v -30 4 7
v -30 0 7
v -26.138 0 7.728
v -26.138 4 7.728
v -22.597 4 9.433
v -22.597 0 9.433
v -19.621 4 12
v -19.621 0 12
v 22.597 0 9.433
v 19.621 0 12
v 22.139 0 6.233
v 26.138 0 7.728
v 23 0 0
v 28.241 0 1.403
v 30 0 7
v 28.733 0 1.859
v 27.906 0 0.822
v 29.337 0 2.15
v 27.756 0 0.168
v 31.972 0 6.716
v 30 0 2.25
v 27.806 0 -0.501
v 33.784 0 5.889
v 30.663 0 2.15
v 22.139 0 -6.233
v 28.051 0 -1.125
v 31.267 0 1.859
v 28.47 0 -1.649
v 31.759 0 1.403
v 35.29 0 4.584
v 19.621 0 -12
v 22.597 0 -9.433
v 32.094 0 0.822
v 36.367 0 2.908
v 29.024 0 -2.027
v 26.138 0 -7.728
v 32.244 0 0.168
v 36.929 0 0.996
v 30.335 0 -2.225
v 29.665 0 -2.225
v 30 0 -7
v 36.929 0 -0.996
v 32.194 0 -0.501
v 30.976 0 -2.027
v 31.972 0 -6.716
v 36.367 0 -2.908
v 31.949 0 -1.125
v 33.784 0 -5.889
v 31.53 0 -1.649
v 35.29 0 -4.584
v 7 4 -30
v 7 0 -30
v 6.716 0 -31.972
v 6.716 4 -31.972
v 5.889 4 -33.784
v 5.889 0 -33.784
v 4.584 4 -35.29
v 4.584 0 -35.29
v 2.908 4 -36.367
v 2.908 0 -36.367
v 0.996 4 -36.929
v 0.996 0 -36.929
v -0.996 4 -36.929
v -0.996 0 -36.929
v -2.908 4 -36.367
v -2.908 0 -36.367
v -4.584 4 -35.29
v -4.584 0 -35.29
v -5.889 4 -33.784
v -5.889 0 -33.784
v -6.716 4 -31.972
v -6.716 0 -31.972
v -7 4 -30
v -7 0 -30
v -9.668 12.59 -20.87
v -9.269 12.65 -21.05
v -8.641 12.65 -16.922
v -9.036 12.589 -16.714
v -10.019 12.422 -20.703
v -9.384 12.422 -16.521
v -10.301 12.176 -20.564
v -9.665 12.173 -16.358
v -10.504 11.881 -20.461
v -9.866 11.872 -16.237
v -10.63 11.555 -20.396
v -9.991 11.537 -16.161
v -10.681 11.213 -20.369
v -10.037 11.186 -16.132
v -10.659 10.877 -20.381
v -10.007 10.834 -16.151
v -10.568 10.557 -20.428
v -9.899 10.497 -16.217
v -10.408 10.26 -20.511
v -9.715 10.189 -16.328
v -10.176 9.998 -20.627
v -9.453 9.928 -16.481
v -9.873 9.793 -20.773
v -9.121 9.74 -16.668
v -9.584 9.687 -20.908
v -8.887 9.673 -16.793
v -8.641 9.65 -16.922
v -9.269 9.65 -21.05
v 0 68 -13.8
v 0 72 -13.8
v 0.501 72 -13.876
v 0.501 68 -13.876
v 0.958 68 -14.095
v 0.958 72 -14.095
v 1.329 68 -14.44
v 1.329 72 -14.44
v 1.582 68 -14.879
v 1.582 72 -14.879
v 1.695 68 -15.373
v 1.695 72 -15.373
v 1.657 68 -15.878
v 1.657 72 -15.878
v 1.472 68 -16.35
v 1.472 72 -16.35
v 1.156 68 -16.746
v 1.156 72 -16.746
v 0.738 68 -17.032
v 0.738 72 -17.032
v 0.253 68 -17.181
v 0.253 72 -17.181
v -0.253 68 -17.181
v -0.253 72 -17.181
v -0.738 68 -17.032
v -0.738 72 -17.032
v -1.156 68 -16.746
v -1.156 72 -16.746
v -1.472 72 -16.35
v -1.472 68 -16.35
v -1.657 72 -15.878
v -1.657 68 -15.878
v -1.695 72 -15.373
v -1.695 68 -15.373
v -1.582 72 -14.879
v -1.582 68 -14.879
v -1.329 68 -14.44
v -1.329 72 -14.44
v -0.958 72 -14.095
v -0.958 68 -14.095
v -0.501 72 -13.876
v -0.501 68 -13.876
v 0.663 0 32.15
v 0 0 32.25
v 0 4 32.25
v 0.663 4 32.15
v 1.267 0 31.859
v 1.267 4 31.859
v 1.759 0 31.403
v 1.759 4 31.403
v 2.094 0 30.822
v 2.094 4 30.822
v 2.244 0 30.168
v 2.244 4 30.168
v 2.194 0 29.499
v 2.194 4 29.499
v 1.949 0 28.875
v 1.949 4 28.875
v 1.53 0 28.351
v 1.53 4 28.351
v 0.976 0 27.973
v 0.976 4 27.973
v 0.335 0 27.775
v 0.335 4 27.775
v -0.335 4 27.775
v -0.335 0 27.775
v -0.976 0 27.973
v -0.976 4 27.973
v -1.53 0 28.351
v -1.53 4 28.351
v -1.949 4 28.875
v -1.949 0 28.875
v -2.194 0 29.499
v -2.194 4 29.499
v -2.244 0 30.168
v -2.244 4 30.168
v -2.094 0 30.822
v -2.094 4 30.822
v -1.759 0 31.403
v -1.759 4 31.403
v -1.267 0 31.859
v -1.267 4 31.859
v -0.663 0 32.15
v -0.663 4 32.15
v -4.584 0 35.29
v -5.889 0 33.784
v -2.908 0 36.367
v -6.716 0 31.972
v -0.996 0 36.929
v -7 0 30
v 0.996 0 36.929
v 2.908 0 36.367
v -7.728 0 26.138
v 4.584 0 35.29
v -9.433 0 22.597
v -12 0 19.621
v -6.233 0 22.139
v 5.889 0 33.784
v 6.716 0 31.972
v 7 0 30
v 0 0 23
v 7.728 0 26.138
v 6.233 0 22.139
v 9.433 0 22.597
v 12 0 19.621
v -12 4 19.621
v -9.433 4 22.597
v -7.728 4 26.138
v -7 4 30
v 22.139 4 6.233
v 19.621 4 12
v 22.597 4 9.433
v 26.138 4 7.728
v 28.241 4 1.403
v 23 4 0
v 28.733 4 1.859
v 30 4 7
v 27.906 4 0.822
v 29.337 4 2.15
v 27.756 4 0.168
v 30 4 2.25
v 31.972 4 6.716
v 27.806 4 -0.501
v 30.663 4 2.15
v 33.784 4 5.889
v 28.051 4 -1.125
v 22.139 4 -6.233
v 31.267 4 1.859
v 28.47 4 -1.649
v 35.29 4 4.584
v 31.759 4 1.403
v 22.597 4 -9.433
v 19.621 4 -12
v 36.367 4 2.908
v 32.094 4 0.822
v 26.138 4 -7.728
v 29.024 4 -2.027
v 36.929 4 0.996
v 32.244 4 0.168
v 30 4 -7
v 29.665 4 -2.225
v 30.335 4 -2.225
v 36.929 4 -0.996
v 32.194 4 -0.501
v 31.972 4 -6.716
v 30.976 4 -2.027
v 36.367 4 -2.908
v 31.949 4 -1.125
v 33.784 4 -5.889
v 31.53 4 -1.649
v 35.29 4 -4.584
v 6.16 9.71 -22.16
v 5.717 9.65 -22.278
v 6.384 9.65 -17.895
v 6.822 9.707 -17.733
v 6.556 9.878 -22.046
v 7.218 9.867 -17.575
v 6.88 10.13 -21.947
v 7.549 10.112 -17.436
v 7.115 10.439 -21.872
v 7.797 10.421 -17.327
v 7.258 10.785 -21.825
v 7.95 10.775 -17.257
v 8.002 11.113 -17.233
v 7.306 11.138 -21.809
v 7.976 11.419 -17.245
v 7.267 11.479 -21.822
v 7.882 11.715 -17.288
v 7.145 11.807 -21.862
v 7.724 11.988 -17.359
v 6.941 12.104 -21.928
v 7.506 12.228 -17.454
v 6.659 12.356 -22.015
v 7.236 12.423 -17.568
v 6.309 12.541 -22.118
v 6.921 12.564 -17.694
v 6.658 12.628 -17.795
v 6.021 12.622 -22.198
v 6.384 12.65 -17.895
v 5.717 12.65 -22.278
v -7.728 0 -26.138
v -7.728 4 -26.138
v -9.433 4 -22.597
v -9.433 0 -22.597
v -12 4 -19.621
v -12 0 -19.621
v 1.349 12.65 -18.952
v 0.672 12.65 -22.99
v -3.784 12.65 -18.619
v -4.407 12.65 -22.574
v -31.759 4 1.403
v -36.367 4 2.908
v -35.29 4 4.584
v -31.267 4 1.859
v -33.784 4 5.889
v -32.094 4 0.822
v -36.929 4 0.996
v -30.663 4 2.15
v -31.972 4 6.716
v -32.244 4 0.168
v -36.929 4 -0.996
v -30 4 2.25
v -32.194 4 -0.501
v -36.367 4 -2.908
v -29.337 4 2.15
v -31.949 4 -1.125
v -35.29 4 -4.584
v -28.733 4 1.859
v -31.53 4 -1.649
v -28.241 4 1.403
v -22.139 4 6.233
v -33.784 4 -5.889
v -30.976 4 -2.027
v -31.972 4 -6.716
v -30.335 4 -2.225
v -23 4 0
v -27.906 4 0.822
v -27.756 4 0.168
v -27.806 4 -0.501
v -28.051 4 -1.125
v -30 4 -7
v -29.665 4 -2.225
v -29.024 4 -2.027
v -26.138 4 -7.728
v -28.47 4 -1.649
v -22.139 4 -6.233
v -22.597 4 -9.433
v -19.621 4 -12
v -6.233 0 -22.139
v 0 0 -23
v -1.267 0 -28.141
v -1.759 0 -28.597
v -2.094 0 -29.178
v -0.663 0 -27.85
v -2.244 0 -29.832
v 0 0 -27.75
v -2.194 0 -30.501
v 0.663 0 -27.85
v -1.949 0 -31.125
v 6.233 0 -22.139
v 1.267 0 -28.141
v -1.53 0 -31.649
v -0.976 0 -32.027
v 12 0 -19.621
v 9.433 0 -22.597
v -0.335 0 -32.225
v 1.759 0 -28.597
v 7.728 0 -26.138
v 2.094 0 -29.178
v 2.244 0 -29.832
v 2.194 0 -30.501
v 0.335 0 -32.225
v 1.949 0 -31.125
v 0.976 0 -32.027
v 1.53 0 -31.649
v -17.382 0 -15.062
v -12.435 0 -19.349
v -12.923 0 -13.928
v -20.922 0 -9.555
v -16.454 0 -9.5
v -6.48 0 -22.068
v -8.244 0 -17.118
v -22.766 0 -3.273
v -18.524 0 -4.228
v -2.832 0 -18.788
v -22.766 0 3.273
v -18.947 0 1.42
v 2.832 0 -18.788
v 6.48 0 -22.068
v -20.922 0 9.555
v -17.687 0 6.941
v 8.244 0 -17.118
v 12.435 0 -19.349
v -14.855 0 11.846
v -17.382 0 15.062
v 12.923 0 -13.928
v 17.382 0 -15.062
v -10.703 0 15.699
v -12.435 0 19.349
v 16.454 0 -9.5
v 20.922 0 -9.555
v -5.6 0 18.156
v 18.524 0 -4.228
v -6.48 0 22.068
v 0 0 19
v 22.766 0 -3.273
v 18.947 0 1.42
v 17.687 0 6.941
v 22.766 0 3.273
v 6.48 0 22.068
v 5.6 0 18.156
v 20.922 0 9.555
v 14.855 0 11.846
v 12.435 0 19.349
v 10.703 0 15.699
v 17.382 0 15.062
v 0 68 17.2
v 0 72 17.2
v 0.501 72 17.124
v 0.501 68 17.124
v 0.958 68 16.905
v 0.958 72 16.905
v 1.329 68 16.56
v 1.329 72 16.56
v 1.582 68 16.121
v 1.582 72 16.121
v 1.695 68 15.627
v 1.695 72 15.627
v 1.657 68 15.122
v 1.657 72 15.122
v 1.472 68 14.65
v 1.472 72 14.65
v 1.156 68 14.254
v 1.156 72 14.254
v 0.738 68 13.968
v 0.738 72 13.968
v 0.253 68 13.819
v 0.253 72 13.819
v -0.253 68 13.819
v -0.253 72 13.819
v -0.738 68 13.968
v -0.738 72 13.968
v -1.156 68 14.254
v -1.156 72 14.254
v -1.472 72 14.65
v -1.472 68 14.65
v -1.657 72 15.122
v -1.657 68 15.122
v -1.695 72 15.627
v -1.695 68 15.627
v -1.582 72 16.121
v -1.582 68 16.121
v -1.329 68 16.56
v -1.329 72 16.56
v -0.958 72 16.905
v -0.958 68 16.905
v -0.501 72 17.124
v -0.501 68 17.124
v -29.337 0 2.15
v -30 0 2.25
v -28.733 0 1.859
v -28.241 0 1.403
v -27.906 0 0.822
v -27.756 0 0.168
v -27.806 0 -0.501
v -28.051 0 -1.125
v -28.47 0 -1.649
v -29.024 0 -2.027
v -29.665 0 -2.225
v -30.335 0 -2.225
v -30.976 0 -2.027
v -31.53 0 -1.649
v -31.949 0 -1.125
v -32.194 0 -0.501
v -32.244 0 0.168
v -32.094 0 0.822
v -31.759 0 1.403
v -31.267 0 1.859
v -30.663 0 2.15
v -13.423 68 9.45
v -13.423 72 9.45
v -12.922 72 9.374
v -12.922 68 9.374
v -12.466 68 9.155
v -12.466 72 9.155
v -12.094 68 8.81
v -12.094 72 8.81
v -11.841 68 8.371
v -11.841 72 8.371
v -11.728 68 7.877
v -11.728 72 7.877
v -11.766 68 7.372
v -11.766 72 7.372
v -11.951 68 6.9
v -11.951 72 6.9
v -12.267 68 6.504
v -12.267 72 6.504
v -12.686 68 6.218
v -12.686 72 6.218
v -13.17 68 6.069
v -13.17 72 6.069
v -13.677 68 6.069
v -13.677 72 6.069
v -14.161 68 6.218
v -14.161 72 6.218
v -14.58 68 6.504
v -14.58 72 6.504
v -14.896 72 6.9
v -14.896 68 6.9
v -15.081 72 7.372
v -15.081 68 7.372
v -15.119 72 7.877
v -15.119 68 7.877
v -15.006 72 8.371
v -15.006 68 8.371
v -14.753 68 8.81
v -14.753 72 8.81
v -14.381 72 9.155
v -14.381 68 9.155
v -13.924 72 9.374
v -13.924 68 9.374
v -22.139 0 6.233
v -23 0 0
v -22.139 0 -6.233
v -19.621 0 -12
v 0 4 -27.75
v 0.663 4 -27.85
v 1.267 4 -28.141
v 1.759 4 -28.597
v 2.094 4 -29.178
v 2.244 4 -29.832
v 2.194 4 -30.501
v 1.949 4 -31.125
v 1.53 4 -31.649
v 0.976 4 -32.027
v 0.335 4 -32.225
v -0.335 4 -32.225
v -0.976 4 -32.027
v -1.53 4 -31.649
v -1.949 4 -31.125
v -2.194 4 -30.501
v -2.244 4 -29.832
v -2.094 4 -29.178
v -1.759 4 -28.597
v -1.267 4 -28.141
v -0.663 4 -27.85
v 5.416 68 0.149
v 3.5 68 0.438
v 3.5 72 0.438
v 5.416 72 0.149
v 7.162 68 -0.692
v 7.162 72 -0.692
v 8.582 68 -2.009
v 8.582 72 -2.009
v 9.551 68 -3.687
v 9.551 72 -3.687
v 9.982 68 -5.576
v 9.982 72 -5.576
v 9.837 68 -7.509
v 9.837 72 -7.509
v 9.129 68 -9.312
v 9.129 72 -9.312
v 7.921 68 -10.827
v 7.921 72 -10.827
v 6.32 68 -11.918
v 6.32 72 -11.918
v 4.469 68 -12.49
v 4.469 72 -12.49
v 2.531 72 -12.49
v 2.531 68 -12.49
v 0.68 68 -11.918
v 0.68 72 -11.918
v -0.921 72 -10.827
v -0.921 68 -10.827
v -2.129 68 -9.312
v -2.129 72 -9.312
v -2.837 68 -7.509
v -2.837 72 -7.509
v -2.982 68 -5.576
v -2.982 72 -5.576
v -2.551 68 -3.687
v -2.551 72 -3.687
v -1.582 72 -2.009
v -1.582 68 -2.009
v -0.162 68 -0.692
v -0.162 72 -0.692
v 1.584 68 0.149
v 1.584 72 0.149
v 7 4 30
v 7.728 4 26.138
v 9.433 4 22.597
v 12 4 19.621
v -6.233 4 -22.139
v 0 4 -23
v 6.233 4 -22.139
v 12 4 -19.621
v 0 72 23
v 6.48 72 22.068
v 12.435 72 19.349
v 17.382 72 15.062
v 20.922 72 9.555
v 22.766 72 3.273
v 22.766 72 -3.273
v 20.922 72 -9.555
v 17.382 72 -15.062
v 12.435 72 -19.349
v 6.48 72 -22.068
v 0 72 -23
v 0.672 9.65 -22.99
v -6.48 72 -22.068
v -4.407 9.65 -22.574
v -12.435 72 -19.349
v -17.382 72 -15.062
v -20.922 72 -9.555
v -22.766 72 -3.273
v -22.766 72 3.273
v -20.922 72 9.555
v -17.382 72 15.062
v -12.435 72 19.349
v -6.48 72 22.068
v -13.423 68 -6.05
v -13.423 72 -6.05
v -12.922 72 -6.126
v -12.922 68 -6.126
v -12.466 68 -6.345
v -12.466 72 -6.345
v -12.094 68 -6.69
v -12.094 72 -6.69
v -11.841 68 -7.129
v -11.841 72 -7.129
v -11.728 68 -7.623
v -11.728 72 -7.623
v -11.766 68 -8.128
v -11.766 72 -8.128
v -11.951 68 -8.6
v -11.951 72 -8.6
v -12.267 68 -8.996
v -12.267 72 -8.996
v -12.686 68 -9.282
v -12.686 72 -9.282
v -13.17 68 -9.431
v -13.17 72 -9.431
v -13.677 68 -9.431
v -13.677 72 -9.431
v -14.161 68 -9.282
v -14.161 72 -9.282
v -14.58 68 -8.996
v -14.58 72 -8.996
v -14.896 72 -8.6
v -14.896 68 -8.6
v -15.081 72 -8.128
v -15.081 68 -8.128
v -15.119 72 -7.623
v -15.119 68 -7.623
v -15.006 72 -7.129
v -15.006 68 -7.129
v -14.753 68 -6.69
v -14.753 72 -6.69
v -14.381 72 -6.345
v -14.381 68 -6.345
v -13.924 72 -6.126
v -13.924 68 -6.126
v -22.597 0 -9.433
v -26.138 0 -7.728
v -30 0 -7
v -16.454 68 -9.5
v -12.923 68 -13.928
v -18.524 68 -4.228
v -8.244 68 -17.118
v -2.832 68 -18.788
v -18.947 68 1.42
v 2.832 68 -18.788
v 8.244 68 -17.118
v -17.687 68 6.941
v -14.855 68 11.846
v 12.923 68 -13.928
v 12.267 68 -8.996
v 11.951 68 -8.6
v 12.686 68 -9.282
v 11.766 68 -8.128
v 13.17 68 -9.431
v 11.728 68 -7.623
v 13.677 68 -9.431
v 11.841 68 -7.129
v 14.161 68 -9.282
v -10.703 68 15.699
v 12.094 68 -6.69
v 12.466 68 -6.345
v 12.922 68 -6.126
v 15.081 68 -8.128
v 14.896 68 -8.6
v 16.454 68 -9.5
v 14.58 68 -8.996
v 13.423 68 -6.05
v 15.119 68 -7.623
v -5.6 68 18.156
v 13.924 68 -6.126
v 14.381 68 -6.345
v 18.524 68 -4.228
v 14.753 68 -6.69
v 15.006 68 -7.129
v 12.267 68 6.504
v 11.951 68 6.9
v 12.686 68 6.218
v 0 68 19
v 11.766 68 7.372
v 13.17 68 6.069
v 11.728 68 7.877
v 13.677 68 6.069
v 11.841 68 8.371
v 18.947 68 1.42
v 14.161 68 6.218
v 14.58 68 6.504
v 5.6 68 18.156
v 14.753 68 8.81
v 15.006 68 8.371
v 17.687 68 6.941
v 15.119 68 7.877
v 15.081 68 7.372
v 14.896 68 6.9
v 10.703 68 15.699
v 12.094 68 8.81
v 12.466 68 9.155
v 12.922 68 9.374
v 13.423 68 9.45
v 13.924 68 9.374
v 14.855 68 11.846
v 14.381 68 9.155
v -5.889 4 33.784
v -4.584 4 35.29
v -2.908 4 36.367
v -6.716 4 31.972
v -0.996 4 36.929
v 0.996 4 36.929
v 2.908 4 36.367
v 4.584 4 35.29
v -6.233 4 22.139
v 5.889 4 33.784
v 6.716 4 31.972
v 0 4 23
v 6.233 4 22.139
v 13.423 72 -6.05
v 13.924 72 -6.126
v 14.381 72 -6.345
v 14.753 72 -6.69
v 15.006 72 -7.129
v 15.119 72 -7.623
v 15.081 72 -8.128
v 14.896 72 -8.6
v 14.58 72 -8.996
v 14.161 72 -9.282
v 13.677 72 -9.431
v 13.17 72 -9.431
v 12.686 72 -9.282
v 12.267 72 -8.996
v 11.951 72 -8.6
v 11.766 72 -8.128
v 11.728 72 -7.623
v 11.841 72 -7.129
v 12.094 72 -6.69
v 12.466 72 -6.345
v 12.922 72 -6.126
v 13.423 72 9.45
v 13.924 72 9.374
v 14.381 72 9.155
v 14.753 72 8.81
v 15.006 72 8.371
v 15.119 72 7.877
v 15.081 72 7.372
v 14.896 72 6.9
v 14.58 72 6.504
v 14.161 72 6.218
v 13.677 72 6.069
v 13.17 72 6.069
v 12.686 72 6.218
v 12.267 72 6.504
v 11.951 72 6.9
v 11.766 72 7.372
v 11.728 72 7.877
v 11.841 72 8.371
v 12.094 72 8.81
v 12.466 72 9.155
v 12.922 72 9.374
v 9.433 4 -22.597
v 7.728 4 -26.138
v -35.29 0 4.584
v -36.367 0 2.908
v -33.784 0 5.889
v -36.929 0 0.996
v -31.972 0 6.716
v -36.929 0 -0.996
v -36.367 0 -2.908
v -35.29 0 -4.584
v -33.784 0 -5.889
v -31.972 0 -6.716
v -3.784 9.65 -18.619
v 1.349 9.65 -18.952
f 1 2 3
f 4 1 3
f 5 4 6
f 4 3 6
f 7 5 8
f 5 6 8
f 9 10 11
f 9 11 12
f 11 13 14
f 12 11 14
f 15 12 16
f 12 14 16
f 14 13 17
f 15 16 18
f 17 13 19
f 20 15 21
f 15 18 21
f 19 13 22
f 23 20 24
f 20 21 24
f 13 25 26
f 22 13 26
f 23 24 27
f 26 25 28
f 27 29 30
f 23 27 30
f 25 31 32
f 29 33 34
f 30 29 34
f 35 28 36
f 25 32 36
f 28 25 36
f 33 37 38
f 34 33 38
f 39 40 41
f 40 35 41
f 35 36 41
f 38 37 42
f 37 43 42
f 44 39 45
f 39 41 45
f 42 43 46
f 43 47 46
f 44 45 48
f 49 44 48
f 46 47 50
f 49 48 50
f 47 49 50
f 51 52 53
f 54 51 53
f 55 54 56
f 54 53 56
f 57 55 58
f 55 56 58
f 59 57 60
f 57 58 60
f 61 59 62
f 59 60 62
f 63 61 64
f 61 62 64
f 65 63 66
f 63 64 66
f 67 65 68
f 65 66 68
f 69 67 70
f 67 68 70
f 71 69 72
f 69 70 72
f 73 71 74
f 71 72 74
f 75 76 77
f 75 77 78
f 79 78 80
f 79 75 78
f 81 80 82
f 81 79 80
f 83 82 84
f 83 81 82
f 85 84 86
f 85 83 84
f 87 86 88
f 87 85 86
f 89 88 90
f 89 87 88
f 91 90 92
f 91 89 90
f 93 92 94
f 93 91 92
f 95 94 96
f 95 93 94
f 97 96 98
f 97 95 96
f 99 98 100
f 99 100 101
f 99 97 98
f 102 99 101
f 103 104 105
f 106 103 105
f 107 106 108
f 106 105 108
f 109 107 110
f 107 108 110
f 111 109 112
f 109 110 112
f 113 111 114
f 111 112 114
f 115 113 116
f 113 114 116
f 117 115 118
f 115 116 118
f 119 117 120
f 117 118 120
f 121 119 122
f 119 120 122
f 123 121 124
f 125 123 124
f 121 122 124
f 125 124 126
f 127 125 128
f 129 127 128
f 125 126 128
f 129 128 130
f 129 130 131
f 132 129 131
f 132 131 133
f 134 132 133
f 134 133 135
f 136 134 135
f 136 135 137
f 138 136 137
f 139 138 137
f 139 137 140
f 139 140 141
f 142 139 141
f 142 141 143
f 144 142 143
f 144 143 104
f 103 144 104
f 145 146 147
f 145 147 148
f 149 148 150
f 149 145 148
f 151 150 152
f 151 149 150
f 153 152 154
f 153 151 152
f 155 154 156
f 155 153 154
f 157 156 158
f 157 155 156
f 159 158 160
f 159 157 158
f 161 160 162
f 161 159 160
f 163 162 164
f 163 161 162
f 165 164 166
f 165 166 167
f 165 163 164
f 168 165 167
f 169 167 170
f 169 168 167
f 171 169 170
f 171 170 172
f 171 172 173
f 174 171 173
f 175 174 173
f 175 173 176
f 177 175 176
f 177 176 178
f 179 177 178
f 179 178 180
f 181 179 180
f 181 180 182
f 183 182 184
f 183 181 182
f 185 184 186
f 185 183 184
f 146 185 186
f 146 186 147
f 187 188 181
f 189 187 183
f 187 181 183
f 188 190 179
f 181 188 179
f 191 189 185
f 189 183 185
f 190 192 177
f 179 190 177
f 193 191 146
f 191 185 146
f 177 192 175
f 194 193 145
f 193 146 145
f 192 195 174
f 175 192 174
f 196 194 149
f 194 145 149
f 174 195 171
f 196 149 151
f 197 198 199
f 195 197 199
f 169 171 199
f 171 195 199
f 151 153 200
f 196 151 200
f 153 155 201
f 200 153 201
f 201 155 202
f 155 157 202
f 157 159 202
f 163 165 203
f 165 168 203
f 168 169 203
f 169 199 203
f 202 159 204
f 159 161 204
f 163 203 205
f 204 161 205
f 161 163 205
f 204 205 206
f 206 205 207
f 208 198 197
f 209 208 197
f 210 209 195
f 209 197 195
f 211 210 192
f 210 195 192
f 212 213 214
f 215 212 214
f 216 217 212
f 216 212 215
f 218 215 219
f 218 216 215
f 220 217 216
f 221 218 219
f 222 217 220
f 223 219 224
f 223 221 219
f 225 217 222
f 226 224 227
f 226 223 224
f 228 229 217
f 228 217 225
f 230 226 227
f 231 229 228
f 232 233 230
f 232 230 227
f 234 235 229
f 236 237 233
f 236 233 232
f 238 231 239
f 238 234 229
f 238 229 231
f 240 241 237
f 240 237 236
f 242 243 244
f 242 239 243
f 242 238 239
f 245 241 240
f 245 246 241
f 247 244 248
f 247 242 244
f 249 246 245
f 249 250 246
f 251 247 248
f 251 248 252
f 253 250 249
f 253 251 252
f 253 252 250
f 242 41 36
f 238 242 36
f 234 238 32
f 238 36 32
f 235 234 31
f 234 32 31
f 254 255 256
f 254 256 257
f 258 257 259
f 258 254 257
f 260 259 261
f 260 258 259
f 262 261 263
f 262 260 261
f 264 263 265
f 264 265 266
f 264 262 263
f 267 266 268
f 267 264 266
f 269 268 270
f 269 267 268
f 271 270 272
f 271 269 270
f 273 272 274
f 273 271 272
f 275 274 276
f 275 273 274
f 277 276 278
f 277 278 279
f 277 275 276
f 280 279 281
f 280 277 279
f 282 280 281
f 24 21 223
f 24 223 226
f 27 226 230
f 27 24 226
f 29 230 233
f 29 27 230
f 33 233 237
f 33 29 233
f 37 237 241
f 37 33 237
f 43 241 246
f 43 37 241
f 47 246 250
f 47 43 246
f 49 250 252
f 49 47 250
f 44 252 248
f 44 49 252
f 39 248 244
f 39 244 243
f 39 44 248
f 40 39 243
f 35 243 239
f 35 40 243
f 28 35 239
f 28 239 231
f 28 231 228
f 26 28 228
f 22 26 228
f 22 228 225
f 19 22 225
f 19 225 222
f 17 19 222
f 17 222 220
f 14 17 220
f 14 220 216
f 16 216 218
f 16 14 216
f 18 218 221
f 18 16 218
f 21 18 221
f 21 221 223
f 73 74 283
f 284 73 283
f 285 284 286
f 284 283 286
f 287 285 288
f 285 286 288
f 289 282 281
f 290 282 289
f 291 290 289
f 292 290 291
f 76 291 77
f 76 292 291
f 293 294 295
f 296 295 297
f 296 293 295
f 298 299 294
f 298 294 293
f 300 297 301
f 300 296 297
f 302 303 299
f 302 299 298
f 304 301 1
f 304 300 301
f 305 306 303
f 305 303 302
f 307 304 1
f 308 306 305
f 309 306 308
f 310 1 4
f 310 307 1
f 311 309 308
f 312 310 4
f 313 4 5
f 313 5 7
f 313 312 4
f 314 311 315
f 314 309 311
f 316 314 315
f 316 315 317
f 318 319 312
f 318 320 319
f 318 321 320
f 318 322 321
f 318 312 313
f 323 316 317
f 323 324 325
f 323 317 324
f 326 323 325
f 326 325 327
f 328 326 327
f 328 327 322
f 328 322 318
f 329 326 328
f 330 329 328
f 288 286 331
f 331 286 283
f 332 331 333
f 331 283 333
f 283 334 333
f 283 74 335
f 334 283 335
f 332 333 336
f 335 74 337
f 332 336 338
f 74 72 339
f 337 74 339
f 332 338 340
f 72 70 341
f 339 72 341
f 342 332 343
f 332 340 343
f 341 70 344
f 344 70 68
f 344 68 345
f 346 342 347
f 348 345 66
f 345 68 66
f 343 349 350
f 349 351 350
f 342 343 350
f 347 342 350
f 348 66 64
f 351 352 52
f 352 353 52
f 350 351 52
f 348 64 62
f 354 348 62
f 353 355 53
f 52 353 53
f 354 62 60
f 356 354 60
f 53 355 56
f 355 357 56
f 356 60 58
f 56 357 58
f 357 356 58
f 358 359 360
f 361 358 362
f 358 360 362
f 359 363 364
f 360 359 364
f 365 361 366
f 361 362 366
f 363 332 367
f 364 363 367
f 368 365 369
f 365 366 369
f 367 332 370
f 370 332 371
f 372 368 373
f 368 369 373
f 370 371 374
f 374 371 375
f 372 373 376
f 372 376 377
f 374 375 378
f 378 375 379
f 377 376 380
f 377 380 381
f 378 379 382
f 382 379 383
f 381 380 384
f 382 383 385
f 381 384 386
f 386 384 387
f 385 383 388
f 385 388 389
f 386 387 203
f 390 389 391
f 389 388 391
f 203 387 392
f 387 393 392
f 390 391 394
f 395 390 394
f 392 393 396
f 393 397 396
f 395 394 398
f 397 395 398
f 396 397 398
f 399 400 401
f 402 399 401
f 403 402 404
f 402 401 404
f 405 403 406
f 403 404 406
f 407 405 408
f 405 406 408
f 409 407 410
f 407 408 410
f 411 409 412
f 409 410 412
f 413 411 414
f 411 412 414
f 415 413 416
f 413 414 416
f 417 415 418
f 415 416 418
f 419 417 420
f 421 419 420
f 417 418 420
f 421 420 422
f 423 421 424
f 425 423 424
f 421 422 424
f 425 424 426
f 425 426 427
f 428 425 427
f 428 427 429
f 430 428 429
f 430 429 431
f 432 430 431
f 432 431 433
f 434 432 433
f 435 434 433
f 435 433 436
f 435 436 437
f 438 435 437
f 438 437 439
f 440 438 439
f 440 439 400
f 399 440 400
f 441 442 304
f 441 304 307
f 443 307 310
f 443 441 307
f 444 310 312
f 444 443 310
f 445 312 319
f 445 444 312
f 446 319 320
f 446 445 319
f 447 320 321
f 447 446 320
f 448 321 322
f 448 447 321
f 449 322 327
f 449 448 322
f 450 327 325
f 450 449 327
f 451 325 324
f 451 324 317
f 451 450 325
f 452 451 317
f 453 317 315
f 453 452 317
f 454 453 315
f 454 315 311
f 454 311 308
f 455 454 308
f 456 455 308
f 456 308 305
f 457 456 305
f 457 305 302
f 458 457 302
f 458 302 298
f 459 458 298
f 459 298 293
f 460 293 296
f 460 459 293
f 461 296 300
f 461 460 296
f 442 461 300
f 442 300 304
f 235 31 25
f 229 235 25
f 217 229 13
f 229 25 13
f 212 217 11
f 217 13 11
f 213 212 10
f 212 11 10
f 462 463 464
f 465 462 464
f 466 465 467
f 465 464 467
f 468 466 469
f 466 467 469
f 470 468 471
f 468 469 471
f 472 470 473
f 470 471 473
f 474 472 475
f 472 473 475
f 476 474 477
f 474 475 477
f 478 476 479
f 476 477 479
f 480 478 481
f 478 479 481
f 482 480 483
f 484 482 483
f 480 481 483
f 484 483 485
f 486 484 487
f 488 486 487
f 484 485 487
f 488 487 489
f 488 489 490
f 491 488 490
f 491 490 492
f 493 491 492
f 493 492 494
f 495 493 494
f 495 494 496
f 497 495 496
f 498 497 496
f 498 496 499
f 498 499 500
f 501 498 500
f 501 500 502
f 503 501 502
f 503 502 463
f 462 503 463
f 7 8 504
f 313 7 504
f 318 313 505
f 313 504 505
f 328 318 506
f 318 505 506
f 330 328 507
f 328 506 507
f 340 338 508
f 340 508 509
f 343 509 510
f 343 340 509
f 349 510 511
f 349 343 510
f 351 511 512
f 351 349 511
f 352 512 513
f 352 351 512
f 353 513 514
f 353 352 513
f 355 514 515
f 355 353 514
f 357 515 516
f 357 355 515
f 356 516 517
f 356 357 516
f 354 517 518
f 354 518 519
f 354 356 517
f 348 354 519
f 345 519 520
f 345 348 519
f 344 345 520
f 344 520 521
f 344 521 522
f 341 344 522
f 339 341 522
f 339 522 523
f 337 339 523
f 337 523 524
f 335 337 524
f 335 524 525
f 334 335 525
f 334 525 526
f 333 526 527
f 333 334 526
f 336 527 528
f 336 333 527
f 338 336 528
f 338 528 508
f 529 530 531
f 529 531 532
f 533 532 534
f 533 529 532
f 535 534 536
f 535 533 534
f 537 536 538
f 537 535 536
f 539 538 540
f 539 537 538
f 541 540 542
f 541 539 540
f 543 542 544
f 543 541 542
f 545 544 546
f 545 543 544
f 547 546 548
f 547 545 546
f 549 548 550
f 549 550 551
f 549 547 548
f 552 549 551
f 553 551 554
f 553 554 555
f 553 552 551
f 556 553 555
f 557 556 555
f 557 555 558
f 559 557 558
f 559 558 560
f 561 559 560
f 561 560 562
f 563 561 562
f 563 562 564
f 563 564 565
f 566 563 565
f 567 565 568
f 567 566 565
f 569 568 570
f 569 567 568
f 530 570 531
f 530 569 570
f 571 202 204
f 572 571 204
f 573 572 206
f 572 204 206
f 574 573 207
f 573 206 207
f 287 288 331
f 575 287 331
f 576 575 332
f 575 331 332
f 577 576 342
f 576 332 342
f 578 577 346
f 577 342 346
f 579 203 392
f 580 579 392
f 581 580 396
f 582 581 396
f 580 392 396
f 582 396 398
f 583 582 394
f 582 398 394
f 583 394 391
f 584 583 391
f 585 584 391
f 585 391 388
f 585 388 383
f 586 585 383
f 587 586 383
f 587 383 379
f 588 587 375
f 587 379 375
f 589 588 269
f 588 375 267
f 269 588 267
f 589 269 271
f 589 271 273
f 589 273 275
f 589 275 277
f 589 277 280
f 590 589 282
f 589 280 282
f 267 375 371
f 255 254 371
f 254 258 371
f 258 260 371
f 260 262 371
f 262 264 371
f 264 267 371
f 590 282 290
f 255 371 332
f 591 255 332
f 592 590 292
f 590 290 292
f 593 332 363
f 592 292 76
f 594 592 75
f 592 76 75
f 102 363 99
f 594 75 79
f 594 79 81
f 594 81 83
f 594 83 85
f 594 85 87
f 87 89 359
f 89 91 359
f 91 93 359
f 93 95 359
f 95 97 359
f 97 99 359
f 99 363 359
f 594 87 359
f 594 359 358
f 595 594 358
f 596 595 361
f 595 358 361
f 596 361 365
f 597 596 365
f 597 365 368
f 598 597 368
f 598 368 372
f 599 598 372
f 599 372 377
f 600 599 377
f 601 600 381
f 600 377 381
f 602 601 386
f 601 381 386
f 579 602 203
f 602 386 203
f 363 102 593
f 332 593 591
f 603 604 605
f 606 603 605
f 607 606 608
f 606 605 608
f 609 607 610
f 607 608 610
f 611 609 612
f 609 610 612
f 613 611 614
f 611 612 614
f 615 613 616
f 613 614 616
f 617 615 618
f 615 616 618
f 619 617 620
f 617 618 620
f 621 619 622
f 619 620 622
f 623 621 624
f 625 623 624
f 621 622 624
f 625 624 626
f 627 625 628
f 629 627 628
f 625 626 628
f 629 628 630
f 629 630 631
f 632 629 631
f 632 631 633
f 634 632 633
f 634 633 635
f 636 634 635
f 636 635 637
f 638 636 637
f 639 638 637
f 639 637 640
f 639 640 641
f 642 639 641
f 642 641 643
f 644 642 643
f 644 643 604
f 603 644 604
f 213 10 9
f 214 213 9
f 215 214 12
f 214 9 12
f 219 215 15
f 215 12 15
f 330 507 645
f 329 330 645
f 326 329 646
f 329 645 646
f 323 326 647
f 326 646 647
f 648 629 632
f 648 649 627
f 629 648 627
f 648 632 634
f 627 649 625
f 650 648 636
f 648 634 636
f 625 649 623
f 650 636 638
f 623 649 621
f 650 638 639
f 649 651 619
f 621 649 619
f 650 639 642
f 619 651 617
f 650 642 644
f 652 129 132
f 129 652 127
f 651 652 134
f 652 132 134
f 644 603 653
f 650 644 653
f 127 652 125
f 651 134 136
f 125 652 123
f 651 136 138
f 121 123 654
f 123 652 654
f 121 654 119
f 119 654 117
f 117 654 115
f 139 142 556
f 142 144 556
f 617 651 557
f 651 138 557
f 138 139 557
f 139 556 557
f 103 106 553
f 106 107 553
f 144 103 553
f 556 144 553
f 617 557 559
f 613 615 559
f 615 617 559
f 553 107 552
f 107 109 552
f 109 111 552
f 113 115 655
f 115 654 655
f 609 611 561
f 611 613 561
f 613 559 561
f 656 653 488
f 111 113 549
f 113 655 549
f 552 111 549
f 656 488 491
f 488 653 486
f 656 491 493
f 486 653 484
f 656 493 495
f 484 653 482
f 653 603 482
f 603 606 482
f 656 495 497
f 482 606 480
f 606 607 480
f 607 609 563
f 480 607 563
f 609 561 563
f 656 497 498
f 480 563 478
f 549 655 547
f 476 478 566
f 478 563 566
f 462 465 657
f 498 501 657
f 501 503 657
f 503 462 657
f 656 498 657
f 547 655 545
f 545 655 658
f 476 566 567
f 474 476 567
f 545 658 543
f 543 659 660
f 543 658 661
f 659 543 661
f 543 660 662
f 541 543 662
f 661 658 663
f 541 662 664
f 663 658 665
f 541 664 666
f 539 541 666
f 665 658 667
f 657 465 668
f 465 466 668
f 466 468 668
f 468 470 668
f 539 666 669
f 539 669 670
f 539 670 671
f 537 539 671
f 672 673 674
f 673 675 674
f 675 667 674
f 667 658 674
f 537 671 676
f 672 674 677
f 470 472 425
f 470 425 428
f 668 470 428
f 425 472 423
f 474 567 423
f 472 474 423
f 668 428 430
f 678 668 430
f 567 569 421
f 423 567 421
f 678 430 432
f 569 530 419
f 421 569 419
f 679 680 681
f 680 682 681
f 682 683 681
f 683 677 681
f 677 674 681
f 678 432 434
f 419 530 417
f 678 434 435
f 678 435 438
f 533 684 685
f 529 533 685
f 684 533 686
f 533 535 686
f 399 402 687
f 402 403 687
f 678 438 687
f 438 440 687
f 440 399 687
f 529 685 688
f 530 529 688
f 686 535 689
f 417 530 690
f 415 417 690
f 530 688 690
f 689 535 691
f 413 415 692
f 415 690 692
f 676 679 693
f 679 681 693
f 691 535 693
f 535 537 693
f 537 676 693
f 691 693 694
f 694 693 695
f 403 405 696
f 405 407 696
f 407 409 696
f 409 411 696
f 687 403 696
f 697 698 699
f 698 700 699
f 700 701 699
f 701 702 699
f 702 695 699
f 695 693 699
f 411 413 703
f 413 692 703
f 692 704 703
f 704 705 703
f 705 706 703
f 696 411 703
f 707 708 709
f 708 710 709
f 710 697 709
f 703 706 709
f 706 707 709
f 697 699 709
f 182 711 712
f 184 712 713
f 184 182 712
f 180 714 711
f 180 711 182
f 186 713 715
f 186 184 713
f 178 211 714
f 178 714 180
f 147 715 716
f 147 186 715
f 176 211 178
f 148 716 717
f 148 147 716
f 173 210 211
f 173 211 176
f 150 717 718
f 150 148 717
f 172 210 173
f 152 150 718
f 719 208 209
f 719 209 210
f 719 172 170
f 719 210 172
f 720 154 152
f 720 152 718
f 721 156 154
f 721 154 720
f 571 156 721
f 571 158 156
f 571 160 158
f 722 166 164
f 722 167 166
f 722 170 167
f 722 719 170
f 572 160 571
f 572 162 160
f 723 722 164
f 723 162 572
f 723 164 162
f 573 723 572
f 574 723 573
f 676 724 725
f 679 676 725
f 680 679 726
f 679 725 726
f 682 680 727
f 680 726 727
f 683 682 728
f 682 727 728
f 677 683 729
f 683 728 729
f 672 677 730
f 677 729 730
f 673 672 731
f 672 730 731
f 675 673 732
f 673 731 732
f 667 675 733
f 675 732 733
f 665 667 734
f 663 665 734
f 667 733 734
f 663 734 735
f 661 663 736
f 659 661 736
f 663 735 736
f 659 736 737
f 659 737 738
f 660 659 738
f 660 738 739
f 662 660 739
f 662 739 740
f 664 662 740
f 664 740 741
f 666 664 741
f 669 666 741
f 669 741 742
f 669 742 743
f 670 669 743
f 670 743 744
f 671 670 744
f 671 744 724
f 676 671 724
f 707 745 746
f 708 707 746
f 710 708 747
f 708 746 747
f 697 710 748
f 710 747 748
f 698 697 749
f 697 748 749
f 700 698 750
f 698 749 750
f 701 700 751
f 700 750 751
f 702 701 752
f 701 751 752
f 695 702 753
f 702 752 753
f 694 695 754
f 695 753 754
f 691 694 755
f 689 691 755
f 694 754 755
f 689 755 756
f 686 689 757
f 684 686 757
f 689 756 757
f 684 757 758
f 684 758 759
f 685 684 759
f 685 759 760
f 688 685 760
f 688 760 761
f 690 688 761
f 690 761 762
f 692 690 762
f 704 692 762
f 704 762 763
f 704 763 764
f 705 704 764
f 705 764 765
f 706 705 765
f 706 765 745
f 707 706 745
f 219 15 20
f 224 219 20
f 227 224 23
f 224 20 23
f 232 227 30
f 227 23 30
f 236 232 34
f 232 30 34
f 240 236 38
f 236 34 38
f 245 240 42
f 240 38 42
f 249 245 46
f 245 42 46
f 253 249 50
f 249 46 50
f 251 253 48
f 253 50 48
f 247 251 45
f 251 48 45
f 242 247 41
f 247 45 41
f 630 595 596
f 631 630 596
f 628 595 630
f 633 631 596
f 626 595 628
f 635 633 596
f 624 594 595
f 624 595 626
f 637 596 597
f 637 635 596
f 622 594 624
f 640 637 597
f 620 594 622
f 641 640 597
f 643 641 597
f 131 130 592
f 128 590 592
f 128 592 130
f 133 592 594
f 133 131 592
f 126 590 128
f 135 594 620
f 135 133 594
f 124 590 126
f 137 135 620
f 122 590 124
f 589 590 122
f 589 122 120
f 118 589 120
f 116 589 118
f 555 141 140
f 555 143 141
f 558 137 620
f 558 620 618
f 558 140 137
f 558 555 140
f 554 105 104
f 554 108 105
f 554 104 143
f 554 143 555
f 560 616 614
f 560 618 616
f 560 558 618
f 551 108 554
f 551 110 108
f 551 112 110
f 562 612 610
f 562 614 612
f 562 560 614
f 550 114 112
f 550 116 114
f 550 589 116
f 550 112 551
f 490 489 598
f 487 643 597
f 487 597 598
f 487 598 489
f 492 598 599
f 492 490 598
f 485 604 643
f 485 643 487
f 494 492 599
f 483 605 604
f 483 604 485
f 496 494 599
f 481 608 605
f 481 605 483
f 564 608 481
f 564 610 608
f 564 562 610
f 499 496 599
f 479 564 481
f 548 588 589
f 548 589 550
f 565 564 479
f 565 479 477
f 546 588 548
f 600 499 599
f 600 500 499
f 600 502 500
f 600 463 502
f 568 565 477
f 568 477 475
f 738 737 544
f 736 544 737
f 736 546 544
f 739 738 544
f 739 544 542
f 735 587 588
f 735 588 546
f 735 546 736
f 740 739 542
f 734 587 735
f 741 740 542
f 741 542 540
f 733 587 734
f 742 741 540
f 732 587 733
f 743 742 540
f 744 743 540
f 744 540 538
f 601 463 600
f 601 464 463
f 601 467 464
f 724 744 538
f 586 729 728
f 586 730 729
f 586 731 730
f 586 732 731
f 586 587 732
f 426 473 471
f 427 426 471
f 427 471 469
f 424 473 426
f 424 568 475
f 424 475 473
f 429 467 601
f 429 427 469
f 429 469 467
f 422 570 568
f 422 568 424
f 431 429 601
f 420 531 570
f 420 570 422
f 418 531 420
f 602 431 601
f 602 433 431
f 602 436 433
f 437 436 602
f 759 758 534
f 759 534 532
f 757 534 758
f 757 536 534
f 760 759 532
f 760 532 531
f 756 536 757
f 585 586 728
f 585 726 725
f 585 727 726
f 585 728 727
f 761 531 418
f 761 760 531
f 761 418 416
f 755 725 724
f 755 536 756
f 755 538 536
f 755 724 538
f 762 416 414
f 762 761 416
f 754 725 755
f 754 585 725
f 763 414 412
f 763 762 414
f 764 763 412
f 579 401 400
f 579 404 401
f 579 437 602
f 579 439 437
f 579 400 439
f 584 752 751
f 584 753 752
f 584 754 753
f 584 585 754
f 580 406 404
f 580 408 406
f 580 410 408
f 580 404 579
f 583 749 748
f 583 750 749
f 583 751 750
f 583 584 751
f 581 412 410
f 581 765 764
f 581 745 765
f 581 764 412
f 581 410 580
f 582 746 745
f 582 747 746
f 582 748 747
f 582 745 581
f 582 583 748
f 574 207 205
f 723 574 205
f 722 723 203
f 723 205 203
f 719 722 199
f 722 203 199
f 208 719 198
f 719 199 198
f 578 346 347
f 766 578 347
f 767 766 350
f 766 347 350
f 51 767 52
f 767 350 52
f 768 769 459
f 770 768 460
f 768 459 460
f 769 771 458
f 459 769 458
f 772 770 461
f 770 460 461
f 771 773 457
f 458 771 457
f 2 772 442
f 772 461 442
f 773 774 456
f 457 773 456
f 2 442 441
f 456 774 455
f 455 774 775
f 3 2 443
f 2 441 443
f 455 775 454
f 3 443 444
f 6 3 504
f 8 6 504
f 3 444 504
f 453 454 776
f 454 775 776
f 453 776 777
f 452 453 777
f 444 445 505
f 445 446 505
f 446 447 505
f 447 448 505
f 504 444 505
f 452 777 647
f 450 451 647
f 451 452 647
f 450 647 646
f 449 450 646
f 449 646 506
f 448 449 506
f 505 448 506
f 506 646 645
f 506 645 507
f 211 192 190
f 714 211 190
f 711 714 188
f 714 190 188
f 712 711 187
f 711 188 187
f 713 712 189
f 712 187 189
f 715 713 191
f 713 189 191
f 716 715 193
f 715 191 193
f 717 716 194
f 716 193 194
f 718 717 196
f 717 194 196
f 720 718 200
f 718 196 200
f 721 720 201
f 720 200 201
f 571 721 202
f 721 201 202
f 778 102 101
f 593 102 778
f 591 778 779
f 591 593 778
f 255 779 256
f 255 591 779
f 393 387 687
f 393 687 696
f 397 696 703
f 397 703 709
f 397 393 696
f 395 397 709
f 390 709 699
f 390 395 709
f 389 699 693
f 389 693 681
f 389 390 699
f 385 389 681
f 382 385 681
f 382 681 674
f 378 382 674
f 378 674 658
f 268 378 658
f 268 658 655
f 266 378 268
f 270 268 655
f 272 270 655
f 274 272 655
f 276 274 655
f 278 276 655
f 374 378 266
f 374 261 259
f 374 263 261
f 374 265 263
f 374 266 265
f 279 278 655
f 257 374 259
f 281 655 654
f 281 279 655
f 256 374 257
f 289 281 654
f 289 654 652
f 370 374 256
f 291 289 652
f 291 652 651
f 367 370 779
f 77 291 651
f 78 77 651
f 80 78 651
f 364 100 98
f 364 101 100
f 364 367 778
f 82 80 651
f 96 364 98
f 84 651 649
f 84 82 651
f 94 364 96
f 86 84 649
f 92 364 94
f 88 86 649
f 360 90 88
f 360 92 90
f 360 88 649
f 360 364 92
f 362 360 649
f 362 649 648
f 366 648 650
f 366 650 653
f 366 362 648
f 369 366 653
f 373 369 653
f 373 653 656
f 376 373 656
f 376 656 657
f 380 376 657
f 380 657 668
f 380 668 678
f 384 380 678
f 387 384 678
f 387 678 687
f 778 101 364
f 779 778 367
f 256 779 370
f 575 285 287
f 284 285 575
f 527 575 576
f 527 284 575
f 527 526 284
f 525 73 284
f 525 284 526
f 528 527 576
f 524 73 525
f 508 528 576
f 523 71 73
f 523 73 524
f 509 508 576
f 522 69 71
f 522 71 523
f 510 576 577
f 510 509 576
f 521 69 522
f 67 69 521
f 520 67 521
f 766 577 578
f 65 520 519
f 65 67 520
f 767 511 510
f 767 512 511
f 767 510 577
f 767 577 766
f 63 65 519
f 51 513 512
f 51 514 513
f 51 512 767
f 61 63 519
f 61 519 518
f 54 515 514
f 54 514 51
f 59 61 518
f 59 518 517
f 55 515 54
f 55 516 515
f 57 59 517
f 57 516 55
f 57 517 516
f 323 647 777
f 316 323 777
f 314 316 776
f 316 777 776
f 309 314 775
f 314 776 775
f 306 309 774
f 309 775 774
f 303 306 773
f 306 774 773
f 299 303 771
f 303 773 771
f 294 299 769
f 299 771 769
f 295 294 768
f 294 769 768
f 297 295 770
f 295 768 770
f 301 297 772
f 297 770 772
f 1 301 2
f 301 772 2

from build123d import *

# Parameters (mm, degrees)
SKETCH2_R                  = 2.25
BOSS_EXTRUDE_FLANG_DEPTH   = 4
BOSS_EXTRUDE_FLANG_2_DEPTH = 4
BOSS_EXTRUDE_FLANG_3_DEPTH = 4
BOSS_EXTRUDE_FLANG_4_DEPTH = 4
SKETCH2_3_R                = 19
BOSS_EXTRUDE_WALL_DEPTH    = 68
SKETCH5_R                  = 23
SKETCH5_R_2                = 6.5
BOSS_EXTRUDE4_DEPTH        = 4
SKETCH6_R                  = 1.7
CUT_EXTRUDE2_DEPTH         = 90.0056178
CUT_EXTRUDE4_DEPTH         = 8


with BuildPart() as part:
    # Sketch2 → Boss-Extrude_flang (new body)
    with BuildSketch(Plane(origin=(0, 0, 0), x_dir=(1, 0, 0), z_dir=(0, 1, 0))):
        with BuildLine():
            ThreePointArc((19.62141687, 12), (23, 0), (19.62141687, -12))
            ThreePointArc((19.62141687, -12), (24.31156558, -8.463920877), (30, -7))
            ThreePointArc((30, -7), (37, 0), (30, 7))
            ThreePointArc((30, 7), (24.31156558, 8.463920877), (19.62141687, 12))
        make_face()
        with Locations((30, 0)):
            Circle(SKETCH2_R, mode=Mode.SUBTRACT)
    extrude(amount=BOSS_EXTRUDE_FLANG_DEPTH)


with BuildPart() as body_2:
    # Sketch2 → Boss-Extrude_flang 2 (new body)
    with BuildSketch(Plane(origin=(0, 0, 0), x_dir=(1, 0, 0), z_dir=(0, 1, 0))):
        with BuildLine():
            ThreePointArc((-12, 19.62141687), (0, 23), (12, 19.62141687))
            ThreePointArc((12, 19.62141687), (8.463920877, 24.31156558), (7, 30))
            ThreePointArc((7, 30), (0, 37), (-7, 30))
            ThreePointArc((-7, 30), (-8.463920877, 24.31156558), (-12, 19.62141687))
        make_face()
        with Locations((0, 30)):
            Circle(SKETCH2_R, mode=Mode.SUBTRACT)
    extrude(amount=BOSS_EXTRUDE_FLANG_2_DEPTH)


with BuildPart() as body_3:
    # Sketch2 → Boss-Extrude_flang 3 (new body)
    with BuildSketch(Plane(origin=(0, 0, 0), x_dir=(1, 0, 0), z_dir=(0, 1, 0))):
        with BuildLine():
            ThreePointArc((7, -30), (8.463920877, -24.31156558), (12, -19.62141687))
            ThreePointArc((12, -19.62141687), (0, -23), (-12, -19.62141687))
            ThreePointArc((-12, -19.62141687), (-8.463920877, -24.31156558), (-7, -30))
            ThreePointArc((-7, -30), (0, -37), (7, -30))
        make_face()
        with Locations((0, -30)):
            Circle(SKETCH2_R, mode=Mode.SUBTRACT)
    extrude(amount=BOSS_EXTRUDE_FLANG_3_DEPTH)


with BuildPart() as body_4:
    # Sketch2 → Boss-Extrude_flang 4 (new body)
    with BuildSketch(Plane(origin=(0, 0, 0), x_dir=(1, 0, 0), z_dir=(0, 1, 0))):
        with BuildLine():
            ThreePointArc((-19.62141687, -12), (-23, 0), (-19.62141687, 12))
            ThreePointArc((-19.62141687, 12), (-24.31156558, 8.463920877), (-30, 7))
            ThreePointArc((-30, 7), (-37, 0), (-30, -7))
            ThreePointArc((-30, -7), (-24.31156558, -8.463920877), (-19.62141687, -12))
        make_face()
        with Locations((-30, 0)):
            Circle(SKETCH2_R, mode=Mode.SUBTRACT)
    extrude(amount=BOSS_EXTRUDE_FLANG_4_DEPTH)


with BuildPart() as body_5:
    # Sketch2<3> → Boss-Extrude_wall (new body)
    with BuildSketch(Plane(origin=(0, 0, 0), x_dir=(1, 0, 0), z_dir=(0, 1, 0))):
        with BuildLine():
            ThreePointArc((19.62141687, -12), (22.139247819, -6.233274099), (23, 0))
            ThreePointArc((23, 0), (22.139247819, 6.233274099), (19.62141687, 12))
            ThreePointArc((19.62141687, 12), (16.263455967, 16.263455967), (12, 19.62141687))
            ThreePointArc((12, 19.62141687), (0, 23), (-12, 19.62141687))
            ThreePointArc((-12, 19.62141687), (-16.263455967, 16.263455967), (-19.62141687, 12))
            ThreePointArc((-19.62141687, 12), (-23, 0), (-19.62141687, -12))
            ThreePointArc((-19.62141687, -12), (-16.263455967, -16.263455967), (-12, -19.62141687))
            ThreePointArc((-12, -19.62141687), (0, -23), (12, -19.62141687))
            ThreePointArc((12, -19.62141687), (16.263455967, -16.263455967), (19.62141687, -12))
        make_face()
        Circle(SKETCH2_3_R, mode=Mode.SUBTRACT)
    extrude(amount=BOSS_EXTRUDE_WALL_DEPTH)

    # Sketch5 → Boss-Extrude4 (add)
    with BuildSketch(Plane(origin=(0, 68, 0), x_dir=(1, 0, 0), z_dir=(0, 1, 0))):
        Circle(SKETCH5_R)
        with Locations((3.5, 6.062177826)):
            Circle(SKETCH5_R_2, mode=Mode.SUBTRACT)
    extrude(amount=BOSS_EXTRUDE4_DEPTH)

    # Sketch6 → Cut-Extrude2 (cut, through all)
    with BuildSketch(Plane(origin=(0, 72, 0), x_dir=(1, 0, 0), z_dir=(0, 1, 0))):
        with Locations((0, 15.5)):
            Circle(SKETCH6_R)
        with Locations((13.423393759, 7.75)):
            Circle(SKETCH6_R)
        with Locations((13.423393759, -7.75)):
            Circle(SKETCH6_R)
        with Locations((0, -15.5)):
            Circle(SKETCH6_R)
        with Locations((-13.423393759, -7.75)):
            Circle(SKETCH6_R)
        with Locations((-13.423393759, 7.75)):
            Circle(SKETCH6_R)
    extrude(amount=-CUT_EXTRUDE2_DEPTH, mode=Mode.SUBTRACT)

    # Sketch8 → Cut-Extrude4 (cut)
    with BuildSketch(Plane(origin=(-3.459717013, 0, -22.738301568), x_dir=(-0.988621807299977, 0, 0.15042247880861212), z_dir=(-0.15042247880861212, 0, -0.988621807299977))):
        with BuildLine():
            Line((5.996820741, 9.65), (-9.003179259, 9.65))
            ThreePointArc((-9.003179259, 9.65), (-10.503179259, 11.15), (-9.003179259, 12.65))
            Line((-9.003179259, 12.65), (5.996820741, 12.65))
            ThreePointArc((5.996820741, 12.65), (7.496820741, 11.15), (5.996820741, 9.65))
        make_face()
    extrude(amount=-CUT_EXTRUDE4_DEPTH, mode=Mode.SUBTRACT)


solid = Compound([part.part, body_2.part, body_3.part, body_4.part, body_5.part])
